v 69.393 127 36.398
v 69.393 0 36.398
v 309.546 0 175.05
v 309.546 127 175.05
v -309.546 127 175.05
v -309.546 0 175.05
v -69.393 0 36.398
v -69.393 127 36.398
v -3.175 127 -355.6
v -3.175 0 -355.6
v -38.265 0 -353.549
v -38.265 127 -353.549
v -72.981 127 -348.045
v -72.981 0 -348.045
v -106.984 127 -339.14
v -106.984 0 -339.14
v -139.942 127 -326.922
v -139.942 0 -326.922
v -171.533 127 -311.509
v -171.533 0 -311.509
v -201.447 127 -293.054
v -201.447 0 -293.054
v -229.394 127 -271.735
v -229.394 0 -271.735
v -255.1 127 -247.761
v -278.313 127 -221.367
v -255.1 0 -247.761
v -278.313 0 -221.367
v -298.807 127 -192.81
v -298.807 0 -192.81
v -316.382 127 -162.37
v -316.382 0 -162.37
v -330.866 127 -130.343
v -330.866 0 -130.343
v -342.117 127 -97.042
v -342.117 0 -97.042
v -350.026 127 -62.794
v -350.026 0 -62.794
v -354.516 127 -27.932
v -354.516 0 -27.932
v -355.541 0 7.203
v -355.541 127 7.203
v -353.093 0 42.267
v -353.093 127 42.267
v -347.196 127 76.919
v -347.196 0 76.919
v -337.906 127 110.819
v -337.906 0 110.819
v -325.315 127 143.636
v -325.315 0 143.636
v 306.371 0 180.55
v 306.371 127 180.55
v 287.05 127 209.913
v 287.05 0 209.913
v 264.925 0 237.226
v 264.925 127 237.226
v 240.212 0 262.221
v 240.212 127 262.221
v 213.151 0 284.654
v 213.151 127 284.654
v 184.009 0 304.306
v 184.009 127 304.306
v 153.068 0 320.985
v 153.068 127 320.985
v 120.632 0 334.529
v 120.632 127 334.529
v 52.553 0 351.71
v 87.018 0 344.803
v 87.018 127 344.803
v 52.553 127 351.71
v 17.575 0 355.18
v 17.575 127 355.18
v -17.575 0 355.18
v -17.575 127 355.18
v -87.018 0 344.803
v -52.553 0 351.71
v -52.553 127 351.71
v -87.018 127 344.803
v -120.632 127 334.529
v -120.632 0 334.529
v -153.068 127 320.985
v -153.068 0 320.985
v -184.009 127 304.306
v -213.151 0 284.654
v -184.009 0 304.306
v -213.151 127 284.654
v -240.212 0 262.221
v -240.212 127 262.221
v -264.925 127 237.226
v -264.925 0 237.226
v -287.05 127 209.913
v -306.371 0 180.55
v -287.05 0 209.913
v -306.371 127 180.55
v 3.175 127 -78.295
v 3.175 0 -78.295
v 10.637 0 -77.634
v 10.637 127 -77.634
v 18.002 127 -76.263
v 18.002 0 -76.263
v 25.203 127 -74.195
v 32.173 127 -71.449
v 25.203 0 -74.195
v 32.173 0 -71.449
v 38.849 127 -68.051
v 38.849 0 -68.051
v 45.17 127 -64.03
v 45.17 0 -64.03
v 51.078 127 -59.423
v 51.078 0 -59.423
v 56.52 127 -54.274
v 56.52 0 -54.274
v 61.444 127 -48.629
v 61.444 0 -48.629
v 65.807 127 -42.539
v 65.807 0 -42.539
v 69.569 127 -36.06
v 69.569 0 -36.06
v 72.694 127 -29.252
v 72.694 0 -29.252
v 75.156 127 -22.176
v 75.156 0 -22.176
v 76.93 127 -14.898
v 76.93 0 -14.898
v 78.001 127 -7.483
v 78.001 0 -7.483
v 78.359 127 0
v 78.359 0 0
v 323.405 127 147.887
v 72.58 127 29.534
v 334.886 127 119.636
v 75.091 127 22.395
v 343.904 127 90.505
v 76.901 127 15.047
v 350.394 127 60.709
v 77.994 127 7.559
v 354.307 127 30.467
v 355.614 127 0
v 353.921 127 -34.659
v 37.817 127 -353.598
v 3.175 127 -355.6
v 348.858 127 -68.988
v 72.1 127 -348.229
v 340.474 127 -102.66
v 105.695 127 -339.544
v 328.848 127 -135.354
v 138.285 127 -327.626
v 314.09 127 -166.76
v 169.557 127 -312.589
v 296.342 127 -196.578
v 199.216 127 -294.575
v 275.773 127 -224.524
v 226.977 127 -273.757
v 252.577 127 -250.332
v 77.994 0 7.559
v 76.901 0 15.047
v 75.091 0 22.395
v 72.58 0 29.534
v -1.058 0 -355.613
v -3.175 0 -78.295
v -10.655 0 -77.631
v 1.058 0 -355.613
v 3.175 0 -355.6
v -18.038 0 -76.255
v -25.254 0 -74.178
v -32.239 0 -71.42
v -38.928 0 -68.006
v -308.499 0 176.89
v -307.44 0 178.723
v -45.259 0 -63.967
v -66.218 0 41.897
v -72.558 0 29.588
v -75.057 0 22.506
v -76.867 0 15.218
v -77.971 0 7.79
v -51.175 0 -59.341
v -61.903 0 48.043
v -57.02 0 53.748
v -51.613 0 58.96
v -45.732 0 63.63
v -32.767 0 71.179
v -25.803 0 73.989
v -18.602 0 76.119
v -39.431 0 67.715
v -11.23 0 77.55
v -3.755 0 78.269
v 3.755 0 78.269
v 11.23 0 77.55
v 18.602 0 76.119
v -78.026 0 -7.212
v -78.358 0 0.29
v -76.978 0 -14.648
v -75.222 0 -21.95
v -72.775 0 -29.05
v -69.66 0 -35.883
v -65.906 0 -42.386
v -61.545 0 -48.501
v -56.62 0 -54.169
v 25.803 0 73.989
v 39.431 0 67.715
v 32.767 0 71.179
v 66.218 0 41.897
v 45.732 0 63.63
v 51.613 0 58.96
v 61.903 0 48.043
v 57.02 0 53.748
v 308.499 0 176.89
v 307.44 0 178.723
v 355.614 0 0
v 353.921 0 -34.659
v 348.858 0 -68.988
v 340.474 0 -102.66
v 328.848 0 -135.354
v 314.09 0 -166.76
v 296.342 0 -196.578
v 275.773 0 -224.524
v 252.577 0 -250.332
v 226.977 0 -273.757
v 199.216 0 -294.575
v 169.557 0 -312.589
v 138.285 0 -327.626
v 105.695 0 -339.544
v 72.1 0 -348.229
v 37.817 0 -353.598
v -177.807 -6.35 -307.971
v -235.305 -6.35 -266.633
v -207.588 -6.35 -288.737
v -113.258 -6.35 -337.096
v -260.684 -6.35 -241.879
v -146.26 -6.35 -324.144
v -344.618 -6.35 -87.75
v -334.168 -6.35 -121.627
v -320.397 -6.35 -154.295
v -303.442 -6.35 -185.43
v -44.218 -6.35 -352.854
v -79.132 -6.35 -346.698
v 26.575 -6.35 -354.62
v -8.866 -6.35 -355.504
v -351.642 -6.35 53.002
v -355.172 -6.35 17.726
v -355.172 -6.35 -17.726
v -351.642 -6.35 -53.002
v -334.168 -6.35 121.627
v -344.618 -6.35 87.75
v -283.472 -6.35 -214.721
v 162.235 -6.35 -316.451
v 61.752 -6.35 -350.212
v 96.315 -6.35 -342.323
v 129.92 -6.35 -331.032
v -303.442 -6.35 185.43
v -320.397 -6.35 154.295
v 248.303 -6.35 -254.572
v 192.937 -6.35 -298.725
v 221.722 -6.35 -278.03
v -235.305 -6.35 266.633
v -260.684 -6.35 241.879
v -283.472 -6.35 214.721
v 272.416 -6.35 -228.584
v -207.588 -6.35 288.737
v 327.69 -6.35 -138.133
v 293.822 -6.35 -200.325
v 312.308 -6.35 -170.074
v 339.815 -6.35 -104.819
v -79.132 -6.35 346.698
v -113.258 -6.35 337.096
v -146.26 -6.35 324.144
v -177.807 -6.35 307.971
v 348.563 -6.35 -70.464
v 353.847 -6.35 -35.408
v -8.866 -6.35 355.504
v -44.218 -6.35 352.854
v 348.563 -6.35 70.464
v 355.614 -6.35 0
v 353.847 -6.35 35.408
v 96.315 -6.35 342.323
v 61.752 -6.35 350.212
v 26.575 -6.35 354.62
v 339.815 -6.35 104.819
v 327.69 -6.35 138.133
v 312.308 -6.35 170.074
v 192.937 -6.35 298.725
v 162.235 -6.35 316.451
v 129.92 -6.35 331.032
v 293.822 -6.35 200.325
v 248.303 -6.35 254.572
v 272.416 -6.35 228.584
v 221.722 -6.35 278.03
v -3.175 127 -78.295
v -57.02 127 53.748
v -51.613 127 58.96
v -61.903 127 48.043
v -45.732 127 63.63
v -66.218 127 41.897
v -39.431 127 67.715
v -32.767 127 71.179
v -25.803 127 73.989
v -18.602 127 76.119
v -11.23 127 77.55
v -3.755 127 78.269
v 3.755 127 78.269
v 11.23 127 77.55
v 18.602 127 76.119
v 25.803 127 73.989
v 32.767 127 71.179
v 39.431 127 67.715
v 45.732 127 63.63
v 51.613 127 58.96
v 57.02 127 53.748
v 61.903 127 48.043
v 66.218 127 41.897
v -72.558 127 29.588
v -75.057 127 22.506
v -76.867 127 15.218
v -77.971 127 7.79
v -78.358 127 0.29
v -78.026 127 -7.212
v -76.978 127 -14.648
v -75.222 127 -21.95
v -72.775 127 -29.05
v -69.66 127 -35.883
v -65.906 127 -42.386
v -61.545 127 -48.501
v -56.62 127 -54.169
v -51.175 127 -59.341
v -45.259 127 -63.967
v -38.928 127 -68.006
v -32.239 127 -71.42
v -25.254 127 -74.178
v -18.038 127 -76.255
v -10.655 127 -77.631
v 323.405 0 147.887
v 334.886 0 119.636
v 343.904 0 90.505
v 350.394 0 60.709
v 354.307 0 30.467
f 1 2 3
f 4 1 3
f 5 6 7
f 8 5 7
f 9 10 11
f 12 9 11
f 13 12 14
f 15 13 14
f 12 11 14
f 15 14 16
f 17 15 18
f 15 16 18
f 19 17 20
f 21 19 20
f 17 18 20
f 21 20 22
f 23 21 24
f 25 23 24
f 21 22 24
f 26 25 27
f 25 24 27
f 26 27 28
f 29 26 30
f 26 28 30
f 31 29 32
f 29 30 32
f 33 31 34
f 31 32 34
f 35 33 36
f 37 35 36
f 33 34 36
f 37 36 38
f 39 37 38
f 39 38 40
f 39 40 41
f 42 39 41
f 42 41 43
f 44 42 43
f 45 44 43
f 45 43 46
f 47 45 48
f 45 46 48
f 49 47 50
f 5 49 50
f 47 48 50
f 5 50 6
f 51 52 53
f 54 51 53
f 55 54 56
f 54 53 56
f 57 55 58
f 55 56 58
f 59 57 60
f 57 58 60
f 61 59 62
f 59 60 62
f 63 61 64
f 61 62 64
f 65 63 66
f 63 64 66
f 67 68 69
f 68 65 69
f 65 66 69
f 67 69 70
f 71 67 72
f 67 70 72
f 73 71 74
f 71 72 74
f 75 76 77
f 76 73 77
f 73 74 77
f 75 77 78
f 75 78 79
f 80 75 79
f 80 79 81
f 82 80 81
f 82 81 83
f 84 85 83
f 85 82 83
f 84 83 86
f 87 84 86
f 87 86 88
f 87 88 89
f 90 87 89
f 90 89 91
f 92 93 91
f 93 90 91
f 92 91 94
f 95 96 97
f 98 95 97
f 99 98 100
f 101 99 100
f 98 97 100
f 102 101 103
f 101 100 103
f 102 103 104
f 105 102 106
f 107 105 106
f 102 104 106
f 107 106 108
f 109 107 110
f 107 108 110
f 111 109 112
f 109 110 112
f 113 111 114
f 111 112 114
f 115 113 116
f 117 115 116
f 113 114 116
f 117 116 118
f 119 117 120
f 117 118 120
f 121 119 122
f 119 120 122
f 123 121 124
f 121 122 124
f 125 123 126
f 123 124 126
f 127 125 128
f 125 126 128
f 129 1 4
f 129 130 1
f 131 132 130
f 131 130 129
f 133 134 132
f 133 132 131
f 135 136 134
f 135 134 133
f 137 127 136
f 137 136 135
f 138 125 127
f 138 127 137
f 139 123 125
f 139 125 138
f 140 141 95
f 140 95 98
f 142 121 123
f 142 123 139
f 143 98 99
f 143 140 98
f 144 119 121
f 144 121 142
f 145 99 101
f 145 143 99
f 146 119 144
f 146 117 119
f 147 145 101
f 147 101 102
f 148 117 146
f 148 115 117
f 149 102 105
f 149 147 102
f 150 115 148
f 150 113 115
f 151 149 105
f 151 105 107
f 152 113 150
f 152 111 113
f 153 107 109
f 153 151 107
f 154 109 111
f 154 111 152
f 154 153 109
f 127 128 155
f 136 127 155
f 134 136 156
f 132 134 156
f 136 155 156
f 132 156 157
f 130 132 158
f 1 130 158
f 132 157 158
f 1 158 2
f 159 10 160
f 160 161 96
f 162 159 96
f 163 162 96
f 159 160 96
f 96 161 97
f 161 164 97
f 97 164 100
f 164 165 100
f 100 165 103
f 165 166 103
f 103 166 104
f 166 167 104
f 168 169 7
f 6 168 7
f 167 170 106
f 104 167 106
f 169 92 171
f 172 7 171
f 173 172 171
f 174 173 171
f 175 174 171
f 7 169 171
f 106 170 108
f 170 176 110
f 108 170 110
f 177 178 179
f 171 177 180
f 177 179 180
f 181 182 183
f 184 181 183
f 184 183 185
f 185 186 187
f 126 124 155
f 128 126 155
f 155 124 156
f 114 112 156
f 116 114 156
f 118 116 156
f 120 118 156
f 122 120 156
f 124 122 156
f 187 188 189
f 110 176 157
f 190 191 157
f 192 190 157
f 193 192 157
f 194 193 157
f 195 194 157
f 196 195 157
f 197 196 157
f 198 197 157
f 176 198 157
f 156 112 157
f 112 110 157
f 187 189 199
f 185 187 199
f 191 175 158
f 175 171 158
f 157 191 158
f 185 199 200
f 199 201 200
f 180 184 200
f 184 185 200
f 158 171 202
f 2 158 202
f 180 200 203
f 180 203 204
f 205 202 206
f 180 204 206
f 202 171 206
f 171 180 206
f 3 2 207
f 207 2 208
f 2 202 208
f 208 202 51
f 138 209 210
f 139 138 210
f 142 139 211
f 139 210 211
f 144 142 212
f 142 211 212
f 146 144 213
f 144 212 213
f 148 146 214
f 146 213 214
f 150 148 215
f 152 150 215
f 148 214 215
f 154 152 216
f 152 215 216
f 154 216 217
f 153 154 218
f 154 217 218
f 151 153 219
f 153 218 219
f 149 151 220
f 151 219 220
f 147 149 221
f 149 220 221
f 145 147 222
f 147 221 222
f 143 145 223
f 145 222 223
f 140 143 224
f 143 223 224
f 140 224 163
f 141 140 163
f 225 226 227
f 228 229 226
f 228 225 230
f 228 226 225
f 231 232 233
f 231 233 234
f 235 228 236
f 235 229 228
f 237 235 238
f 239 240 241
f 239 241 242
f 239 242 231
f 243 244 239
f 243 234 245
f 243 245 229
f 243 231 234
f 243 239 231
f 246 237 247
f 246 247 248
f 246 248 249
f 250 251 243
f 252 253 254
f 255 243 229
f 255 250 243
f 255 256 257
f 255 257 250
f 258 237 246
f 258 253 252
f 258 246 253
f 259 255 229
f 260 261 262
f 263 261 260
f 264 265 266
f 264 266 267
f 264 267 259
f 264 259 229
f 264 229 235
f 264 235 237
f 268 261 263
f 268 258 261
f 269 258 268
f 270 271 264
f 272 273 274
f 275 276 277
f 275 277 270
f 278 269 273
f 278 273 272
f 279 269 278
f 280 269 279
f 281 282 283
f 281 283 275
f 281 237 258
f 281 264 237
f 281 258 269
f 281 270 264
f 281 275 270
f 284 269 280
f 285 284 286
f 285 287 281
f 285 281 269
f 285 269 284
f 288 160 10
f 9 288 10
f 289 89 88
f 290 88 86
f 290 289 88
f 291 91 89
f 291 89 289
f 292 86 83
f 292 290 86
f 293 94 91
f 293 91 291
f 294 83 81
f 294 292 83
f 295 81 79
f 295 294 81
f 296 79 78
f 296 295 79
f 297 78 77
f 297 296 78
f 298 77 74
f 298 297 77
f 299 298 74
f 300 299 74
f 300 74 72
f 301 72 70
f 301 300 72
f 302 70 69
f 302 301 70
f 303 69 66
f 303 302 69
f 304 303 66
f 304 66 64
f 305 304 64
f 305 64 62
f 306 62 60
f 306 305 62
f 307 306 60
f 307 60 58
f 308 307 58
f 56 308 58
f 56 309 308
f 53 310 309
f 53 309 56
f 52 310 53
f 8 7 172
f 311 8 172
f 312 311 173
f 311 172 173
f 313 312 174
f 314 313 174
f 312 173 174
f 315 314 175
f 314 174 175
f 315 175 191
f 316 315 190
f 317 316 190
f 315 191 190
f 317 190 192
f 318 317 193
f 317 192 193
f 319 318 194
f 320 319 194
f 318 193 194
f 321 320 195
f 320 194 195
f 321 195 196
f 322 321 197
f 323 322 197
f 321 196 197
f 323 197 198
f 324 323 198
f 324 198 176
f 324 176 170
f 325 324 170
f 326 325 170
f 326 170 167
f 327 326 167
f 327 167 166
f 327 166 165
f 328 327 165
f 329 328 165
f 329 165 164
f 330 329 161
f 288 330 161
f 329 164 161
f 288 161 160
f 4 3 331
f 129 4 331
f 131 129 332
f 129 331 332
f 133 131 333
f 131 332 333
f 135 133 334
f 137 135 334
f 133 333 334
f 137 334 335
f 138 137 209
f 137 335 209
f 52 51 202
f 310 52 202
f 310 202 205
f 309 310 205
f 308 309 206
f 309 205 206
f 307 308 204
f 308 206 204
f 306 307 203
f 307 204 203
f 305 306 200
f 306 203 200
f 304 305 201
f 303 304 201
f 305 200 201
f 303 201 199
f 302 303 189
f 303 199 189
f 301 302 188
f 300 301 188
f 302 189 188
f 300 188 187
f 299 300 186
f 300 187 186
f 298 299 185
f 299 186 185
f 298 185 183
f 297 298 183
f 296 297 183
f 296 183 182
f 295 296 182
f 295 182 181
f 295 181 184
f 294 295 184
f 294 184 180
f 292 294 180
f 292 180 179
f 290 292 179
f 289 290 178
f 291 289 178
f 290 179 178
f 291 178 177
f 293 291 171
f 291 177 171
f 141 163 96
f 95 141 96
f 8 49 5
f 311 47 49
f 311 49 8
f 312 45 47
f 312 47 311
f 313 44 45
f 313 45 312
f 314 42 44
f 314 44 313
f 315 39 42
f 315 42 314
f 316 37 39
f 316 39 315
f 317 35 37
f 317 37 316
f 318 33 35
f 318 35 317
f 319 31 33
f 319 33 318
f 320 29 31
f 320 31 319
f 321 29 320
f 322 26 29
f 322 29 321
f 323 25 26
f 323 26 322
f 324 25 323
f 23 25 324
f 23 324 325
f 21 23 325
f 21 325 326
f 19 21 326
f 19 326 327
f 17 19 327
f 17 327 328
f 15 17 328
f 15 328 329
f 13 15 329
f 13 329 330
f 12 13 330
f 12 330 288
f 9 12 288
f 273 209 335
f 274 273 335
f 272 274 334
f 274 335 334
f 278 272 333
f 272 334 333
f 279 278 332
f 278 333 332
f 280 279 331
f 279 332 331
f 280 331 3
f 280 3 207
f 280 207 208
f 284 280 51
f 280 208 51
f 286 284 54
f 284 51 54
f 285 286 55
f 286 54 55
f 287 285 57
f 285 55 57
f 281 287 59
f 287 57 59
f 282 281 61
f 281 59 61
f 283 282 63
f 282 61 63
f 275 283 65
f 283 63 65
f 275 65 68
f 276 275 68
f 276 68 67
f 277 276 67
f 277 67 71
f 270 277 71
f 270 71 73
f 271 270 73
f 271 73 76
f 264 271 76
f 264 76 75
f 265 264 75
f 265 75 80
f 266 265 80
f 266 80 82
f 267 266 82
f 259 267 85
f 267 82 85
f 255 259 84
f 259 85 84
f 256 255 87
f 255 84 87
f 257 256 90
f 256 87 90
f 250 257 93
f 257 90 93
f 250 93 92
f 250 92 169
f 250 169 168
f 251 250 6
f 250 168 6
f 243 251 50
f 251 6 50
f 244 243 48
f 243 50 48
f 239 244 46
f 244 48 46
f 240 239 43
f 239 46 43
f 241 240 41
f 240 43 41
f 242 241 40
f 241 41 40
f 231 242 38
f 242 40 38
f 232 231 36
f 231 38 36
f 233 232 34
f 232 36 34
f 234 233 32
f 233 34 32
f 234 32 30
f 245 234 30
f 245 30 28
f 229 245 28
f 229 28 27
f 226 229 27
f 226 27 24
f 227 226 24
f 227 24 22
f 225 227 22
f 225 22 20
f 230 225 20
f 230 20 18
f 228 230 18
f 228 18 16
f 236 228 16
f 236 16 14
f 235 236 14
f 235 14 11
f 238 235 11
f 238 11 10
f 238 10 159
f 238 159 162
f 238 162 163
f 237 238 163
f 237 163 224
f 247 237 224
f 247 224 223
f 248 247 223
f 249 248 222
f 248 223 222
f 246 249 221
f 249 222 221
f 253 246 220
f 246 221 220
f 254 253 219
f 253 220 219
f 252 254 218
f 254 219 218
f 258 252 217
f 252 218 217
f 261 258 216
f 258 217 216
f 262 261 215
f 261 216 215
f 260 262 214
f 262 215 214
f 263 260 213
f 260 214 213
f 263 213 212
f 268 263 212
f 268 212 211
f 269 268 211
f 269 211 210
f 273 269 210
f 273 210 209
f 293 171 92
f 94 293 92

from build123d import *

# Parameters (mm, degrees)
BOSS_EXTRUDE1_DEPTH   = 127
BOSS_EXTRUDE1_2_DEPTH = 127
BOSS_EXTRUDE1_3_DEPTH = 127
SKETCH3_R             = 355.614173825
BOSS_EXTRUDE2_DEPTH   = 6.35


with BuildPart() as part:
    # Sketch2 → Boss-Extrude1 (new body)
    with BuildSketch(Plane(origin=(0, 0, 0), x_dir=(1, 0, 0), z_dir=(0, 1, 0))):
        with BuildLine():
            ThreePointArc((-3.175, 355.6), (-307.970908478, 177.807086912), (-309.546133586, -175.050369343))
            Line((-309.546133586, -175.050369343), (-69.392656087, -36.397694462))
            ThreePointArc((-69.392656087, -36.397694462), (-67.860884615, 39.1795), (-3.175, 78.294650239))
            Line((-3.175, 78.294650239), (-3.175, 355.6))
        make_face()
    extrude(amount=BOSS_EXTRUDE1_DEPTH)



with BuildPart() as body_2:
    # Sketch2 → Boss-Extrude1 2 (new body)
    with BuildSketch(Plane(origin=(0, 0, 0), x_dir=(1, 0, 0), z_dir=(0, 1, 0))):
        with BuildLine():
            Line((69.392656087, -36.397694462), (309.546133586, -175.050369343))
            ThreePointArc((309.546133586, -175.050369343), (343.904371287, -90.505381247), (355.614173825, 0))
            ThreePointArc((355.614173825, 0), (252.577231384, 250.332144983), (3.175, 355.6))
            Line((3.175, 355.6), (3.175, 78.294650239))
            ThreePointArc((3.175, 78.294650239), (56.519566108, 54.274041014), (78.359, 0))
            ThreePointArc((78.359, 0), (76.084400567, -18.74291523), (69.392656087, -36.397694462))
        make_face()
    extrude(amount=BOSS_EXTRUDE1_2_DEPTH)


with BuildPart() as body_3:
    # Sketch2 → Boss-Extrude1 3 (new body)
    with BuildSketch(Plane(origin=(0, 0, 0), x_dir=(1, 0, 0), z_dir=(0, 1, 0))):
        with BuildLine():
            ThreePointArc((-306.371133586, -180.549630657), (0, -355.614173825), (306.371133586, -180.549630657))
            Line((306.371133586, -180.549630657), (66.217656087, -41.896955776))
            ThreePointArc((66.217656087, -41.896955776), (0, -78.359), (-66.217656087, -41.896955776))
            Line((-66.217656087, -41.896955776), (-306.371133586, -180.549630657))
        make_face()
    extrude(amount=BOSS_EXTRUDE1_3_DEPTH)


with BuildPart() as part_1:
    add(part.part)

    add(body_2.part)  # Boss-Extrude2 merges body 2

    add(body_3.part)  # Boss-Extrude2 merges body 3
    # Sketch3 → Boss-Extrude2 (add)
    with BuildSketch(Plane.XZ):
        Circle(SKETCH3_R)
    extrude(amount=BOSS_EXTRUDE2_DEPTH)


solid = part_1.part
